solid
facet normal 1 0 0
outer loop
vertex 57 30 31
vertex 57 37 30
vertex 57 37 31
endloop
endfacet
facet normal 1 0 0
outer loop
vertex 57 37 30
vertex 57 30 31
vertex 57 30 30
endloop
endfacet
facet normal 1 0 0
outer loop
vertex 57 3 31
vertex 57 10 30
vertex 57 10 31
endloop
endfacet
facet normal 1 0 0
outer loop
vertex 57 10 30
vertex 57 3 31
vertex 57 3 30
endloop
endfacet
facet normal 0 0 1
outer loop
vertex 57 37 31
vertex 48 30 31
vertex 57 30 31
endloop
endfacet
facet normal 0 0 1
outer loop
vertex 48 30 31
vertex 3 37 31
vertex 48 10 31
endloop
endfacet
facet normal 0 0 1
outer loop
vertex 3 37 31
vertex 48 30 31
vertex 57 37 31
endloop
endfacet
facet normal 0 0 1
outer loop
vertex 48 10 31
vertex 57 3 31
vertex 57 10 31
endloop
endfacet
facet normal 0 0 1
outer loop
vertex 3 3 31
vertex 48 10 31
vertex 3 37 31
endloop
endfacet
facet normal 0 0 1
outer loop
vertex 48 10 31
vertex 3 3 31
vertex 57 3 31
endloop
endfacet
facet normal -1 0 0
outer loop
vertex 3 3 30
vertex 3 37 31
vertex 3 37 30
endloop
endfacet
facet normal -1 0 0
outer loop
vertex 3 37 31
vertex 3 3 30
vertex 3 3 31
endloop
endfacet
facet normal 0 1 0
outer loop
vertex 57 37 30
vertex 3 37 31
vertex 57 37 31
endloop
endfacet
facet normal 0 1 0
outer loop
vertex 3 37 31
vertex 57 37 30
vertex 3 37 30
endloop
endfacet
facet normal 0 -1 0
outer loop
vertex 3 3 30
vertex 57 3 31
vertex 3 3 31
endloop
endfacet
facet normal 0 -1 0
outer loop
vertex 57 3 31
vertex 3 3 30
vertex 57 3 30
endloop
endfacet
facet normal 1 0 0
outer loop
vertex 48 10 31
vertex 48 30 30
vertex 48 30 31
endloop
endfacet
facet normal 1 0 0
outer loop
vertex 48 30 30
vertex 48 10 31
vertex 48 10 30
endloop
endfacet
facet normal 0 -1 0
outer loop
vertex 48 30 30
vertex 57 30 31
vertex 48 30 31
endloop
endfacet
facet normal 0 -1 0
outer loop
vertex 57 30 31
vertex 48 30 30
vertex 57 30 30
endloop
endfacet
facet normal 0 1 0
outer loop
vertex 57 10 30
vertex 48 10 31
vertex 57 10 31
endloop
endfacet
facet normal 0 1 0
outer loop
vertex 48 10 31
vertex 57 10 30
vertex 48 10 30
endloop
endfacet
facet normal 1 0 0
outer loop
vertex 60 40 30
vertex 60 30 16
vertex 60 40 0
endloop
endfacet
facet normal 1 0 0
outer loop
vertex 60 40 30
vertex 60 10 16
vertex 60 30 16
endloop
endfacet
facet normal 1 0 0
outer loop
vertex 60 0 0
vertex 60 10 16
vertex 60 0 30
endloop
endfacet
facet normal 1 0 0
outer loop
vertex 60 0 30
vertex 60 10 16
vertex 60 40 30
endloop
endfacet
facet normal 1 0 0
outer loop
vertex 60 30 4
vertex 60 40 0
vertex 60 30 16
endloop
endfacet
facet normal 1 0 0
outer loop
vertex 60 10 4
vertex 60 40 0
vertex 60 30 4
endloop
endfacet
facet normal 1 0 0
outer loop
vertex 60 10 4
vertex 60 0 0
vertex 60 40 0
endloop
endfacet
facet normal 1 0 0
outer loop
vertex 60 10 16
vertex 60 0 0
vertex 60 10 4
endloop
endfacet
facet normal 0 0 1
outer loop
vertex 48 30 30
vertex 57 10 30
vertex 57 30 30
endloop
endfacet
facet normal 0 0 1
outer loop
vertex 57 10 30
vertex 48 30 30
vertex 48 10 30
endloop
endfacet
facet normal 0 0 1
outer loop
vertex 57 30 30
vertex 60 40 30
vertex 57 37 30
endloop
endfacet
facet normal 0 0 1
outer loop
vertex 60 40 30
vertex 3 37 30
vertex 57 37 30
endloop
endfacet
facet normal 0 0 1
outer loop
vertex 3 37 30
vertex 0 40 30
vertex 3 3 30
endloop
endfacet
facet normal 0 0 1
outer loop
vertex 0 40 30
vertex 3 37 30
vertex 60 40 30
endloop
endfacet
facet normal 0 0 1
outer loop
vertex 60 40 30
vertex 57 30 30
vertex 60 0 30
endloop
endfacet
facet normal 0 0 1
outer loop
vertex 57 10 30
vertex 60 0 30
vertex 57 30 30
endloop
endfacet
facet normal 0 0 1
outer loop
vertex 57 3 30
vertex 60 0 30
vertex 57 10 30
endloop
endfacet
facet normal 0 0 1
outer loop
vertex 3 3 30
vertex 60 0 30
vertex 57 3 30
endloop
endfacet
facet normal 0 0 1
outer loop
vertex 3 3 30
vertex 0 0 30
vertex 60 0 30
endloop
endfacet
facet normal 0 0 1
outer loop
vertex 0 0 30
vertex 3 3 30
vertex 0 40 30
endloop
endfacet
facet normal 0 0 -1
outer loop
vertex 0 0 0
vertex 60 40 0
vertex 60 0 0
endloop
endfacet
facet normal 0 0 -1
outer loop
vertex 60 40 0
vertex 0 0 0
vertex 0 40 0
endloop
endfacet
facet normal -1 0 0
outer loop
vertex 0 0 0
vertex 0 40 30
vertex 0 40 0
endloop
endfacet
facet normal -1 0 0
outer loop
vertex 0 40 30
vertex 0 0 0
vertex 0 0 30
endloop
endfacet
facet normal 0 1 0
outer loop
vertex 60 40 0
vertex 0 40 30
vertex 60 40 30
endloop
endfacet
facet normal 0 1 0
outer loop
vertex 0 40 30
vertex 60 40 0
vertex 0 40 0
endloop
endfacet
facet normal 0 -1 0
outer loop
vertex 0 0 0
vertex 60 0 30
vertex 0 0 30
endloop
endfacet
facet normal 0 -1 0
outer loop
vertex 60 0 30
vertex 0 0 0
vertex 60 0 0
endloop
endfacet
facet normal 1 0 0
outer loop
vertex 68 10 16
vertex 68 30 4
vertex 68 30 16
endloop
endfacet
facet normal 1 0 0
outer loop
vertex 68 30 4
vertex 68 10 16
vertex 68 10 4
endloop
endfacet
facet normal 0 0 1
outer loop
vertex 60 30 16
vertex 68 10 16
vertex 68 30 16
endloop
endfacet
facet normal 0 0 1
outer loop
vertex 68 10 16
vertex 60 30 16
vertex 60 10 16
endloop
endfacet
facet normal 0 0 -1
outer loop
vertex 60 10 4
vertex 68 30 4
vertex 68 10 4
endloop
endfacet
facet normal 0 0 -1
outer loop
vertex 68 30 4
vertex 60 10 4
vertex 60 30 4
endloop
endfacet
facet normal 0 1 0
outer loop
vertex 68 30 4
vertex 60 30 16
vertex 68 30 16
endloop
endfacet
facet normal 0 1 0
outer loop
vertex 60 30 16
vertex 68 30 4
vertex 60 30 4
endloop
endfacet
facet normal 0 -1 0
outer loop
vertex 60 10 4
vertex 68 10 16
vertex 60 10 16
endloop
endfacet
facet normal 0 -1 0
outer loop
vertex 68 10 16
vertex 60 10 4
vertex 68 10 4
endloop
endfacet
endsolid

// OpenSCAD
// Parametric Stepped Cavity Enclosure with Side Projection
// All dimensions in millimeters, coordinate origin at bottom-left-front corner (Z=0 is part base)

// --------------------------
// Parameter Definitions
// --------------------------
// Main outer body dimensions
body_width = 60;       // X-axis total outer width
body_depth = 40;       // Y-axis total outer depth
body_height = 30;      // Z-axis total height (base at Z=0, top surface at Z=body_height)

// Wall and base thicknesses
top_rim_thickness = 3; // Uniform wall thickness around uppermost cavity opening
base_thickness = 4;    // Solid floor thickness below the lowest pocket

// Top cavity tier (shallowest, widest cut)
upper_recess_depth = 8; // Vertical depth of upper recess measured down from top surface

// Side feature parameters (located on +X face)
proj_protrusion = 8;    // Distance external projection sticks out from body wall
proj_height = 12;       // Vertical height of the external projection
proj_depth = 20;        // Y-axis length of the projection (centered on side face)
proj_base_z = 4;        // Z position of projection bottom edge (sits just above part base)
side_recess_inset = 12; // Horizontal distance the recess above projection cuts into the body
side_recess_floor_z = proj_base_z + proj_height; // Align recess floor exactly with projection top

// Deepest pocket parameters (offset to create uneven internal ledges)
deep_pocket_w = 30;     // X-axis width of lowest cavity
deep_pocket_d = 28;     // Y-axis depth of lowest cavity
deep_pocket_x_offset = -7; // X shift from body center (negative = shifted toward left/X=0 side)
deep_pocket_top_z = body_height - upper_recess_depth; // Align pocket top with upper recess floor
deep_pocket_floor_z = base_thickness; // Align pocket floor with top of solid base

$fn = 50; // Default resolution for curved geometry

// --------------------------
// Reusable Component Modules
// --------------------------
module solid_main_body() {
    // Base rectangular solid that forms the primary enclosure structure
    cube([body_width, body_depth, body_height]);
}

module external_side_projection() {
    // Added rectangular boss protruding from the +X side wall
    translate([
        body_width,
        (body_depth - proj_depth)/2,
        proj_base_z
    ]) {
        cube([proj_protrusion, proj_depth, proj_height]);
    }
}

module cut_upper_recess() {
    // Broad top cavity that creates the thin top rim
    translate([
        top_rim_thickness,
        top_rim_thickness,
        body_height - upper_recess_depth
    ]) {
        cube([
            body_width - 2*top_rim_thickness,
            body_depth - 2*top_rim_thickness,
            upper_recess_depth + 1 // Small overcut to ensure clean top edge
        ]);
    }
}

module cut_side_recess() {
    // Extra stepped cut directly above the external projection
    translate([
        body_width - side_recess_inset,
        (body_depth - proj_depth)/2,
        side_recess_floor_z
    ]) {
        cube([
            side_recess_inset + top_rim_thickness, // Overcut to break through outer wall
            proj_depth,
            body_height - side_recess_floor_z + 1 // Overcut to break through top surface
        ]);
    }
}

module cut_deep_pocket() {
    // Lowest offset cavity that creates uneven interior ledges
    pocket_center_x = body_width/2 + deep_pocket_x_offset;
    translate([
        pocket_center_x - deep_pocket_w/2,
        (body_depth - deep_pocket_d)/2,
        deep_pocket_floor_z
    ]) {
        cube([
            deep_pocket_w,
            deep_pocket_d,
            deep_pocket_top_z - deep_pocket_floor_z + 1 // Overcut to meet upper recess floor
        ]);
    }
}

// --------------------------
// Final Model Assembly
// --------------------------
union() {
    // Combine solid base geometry
    solid_main_body();
    external_side_projection();

    // Subtract all internal cavity features
    difference() {
        children();
        cut_upper_recess();
        cut_side_recess();
        cut_deep_pocket();
    }
}
